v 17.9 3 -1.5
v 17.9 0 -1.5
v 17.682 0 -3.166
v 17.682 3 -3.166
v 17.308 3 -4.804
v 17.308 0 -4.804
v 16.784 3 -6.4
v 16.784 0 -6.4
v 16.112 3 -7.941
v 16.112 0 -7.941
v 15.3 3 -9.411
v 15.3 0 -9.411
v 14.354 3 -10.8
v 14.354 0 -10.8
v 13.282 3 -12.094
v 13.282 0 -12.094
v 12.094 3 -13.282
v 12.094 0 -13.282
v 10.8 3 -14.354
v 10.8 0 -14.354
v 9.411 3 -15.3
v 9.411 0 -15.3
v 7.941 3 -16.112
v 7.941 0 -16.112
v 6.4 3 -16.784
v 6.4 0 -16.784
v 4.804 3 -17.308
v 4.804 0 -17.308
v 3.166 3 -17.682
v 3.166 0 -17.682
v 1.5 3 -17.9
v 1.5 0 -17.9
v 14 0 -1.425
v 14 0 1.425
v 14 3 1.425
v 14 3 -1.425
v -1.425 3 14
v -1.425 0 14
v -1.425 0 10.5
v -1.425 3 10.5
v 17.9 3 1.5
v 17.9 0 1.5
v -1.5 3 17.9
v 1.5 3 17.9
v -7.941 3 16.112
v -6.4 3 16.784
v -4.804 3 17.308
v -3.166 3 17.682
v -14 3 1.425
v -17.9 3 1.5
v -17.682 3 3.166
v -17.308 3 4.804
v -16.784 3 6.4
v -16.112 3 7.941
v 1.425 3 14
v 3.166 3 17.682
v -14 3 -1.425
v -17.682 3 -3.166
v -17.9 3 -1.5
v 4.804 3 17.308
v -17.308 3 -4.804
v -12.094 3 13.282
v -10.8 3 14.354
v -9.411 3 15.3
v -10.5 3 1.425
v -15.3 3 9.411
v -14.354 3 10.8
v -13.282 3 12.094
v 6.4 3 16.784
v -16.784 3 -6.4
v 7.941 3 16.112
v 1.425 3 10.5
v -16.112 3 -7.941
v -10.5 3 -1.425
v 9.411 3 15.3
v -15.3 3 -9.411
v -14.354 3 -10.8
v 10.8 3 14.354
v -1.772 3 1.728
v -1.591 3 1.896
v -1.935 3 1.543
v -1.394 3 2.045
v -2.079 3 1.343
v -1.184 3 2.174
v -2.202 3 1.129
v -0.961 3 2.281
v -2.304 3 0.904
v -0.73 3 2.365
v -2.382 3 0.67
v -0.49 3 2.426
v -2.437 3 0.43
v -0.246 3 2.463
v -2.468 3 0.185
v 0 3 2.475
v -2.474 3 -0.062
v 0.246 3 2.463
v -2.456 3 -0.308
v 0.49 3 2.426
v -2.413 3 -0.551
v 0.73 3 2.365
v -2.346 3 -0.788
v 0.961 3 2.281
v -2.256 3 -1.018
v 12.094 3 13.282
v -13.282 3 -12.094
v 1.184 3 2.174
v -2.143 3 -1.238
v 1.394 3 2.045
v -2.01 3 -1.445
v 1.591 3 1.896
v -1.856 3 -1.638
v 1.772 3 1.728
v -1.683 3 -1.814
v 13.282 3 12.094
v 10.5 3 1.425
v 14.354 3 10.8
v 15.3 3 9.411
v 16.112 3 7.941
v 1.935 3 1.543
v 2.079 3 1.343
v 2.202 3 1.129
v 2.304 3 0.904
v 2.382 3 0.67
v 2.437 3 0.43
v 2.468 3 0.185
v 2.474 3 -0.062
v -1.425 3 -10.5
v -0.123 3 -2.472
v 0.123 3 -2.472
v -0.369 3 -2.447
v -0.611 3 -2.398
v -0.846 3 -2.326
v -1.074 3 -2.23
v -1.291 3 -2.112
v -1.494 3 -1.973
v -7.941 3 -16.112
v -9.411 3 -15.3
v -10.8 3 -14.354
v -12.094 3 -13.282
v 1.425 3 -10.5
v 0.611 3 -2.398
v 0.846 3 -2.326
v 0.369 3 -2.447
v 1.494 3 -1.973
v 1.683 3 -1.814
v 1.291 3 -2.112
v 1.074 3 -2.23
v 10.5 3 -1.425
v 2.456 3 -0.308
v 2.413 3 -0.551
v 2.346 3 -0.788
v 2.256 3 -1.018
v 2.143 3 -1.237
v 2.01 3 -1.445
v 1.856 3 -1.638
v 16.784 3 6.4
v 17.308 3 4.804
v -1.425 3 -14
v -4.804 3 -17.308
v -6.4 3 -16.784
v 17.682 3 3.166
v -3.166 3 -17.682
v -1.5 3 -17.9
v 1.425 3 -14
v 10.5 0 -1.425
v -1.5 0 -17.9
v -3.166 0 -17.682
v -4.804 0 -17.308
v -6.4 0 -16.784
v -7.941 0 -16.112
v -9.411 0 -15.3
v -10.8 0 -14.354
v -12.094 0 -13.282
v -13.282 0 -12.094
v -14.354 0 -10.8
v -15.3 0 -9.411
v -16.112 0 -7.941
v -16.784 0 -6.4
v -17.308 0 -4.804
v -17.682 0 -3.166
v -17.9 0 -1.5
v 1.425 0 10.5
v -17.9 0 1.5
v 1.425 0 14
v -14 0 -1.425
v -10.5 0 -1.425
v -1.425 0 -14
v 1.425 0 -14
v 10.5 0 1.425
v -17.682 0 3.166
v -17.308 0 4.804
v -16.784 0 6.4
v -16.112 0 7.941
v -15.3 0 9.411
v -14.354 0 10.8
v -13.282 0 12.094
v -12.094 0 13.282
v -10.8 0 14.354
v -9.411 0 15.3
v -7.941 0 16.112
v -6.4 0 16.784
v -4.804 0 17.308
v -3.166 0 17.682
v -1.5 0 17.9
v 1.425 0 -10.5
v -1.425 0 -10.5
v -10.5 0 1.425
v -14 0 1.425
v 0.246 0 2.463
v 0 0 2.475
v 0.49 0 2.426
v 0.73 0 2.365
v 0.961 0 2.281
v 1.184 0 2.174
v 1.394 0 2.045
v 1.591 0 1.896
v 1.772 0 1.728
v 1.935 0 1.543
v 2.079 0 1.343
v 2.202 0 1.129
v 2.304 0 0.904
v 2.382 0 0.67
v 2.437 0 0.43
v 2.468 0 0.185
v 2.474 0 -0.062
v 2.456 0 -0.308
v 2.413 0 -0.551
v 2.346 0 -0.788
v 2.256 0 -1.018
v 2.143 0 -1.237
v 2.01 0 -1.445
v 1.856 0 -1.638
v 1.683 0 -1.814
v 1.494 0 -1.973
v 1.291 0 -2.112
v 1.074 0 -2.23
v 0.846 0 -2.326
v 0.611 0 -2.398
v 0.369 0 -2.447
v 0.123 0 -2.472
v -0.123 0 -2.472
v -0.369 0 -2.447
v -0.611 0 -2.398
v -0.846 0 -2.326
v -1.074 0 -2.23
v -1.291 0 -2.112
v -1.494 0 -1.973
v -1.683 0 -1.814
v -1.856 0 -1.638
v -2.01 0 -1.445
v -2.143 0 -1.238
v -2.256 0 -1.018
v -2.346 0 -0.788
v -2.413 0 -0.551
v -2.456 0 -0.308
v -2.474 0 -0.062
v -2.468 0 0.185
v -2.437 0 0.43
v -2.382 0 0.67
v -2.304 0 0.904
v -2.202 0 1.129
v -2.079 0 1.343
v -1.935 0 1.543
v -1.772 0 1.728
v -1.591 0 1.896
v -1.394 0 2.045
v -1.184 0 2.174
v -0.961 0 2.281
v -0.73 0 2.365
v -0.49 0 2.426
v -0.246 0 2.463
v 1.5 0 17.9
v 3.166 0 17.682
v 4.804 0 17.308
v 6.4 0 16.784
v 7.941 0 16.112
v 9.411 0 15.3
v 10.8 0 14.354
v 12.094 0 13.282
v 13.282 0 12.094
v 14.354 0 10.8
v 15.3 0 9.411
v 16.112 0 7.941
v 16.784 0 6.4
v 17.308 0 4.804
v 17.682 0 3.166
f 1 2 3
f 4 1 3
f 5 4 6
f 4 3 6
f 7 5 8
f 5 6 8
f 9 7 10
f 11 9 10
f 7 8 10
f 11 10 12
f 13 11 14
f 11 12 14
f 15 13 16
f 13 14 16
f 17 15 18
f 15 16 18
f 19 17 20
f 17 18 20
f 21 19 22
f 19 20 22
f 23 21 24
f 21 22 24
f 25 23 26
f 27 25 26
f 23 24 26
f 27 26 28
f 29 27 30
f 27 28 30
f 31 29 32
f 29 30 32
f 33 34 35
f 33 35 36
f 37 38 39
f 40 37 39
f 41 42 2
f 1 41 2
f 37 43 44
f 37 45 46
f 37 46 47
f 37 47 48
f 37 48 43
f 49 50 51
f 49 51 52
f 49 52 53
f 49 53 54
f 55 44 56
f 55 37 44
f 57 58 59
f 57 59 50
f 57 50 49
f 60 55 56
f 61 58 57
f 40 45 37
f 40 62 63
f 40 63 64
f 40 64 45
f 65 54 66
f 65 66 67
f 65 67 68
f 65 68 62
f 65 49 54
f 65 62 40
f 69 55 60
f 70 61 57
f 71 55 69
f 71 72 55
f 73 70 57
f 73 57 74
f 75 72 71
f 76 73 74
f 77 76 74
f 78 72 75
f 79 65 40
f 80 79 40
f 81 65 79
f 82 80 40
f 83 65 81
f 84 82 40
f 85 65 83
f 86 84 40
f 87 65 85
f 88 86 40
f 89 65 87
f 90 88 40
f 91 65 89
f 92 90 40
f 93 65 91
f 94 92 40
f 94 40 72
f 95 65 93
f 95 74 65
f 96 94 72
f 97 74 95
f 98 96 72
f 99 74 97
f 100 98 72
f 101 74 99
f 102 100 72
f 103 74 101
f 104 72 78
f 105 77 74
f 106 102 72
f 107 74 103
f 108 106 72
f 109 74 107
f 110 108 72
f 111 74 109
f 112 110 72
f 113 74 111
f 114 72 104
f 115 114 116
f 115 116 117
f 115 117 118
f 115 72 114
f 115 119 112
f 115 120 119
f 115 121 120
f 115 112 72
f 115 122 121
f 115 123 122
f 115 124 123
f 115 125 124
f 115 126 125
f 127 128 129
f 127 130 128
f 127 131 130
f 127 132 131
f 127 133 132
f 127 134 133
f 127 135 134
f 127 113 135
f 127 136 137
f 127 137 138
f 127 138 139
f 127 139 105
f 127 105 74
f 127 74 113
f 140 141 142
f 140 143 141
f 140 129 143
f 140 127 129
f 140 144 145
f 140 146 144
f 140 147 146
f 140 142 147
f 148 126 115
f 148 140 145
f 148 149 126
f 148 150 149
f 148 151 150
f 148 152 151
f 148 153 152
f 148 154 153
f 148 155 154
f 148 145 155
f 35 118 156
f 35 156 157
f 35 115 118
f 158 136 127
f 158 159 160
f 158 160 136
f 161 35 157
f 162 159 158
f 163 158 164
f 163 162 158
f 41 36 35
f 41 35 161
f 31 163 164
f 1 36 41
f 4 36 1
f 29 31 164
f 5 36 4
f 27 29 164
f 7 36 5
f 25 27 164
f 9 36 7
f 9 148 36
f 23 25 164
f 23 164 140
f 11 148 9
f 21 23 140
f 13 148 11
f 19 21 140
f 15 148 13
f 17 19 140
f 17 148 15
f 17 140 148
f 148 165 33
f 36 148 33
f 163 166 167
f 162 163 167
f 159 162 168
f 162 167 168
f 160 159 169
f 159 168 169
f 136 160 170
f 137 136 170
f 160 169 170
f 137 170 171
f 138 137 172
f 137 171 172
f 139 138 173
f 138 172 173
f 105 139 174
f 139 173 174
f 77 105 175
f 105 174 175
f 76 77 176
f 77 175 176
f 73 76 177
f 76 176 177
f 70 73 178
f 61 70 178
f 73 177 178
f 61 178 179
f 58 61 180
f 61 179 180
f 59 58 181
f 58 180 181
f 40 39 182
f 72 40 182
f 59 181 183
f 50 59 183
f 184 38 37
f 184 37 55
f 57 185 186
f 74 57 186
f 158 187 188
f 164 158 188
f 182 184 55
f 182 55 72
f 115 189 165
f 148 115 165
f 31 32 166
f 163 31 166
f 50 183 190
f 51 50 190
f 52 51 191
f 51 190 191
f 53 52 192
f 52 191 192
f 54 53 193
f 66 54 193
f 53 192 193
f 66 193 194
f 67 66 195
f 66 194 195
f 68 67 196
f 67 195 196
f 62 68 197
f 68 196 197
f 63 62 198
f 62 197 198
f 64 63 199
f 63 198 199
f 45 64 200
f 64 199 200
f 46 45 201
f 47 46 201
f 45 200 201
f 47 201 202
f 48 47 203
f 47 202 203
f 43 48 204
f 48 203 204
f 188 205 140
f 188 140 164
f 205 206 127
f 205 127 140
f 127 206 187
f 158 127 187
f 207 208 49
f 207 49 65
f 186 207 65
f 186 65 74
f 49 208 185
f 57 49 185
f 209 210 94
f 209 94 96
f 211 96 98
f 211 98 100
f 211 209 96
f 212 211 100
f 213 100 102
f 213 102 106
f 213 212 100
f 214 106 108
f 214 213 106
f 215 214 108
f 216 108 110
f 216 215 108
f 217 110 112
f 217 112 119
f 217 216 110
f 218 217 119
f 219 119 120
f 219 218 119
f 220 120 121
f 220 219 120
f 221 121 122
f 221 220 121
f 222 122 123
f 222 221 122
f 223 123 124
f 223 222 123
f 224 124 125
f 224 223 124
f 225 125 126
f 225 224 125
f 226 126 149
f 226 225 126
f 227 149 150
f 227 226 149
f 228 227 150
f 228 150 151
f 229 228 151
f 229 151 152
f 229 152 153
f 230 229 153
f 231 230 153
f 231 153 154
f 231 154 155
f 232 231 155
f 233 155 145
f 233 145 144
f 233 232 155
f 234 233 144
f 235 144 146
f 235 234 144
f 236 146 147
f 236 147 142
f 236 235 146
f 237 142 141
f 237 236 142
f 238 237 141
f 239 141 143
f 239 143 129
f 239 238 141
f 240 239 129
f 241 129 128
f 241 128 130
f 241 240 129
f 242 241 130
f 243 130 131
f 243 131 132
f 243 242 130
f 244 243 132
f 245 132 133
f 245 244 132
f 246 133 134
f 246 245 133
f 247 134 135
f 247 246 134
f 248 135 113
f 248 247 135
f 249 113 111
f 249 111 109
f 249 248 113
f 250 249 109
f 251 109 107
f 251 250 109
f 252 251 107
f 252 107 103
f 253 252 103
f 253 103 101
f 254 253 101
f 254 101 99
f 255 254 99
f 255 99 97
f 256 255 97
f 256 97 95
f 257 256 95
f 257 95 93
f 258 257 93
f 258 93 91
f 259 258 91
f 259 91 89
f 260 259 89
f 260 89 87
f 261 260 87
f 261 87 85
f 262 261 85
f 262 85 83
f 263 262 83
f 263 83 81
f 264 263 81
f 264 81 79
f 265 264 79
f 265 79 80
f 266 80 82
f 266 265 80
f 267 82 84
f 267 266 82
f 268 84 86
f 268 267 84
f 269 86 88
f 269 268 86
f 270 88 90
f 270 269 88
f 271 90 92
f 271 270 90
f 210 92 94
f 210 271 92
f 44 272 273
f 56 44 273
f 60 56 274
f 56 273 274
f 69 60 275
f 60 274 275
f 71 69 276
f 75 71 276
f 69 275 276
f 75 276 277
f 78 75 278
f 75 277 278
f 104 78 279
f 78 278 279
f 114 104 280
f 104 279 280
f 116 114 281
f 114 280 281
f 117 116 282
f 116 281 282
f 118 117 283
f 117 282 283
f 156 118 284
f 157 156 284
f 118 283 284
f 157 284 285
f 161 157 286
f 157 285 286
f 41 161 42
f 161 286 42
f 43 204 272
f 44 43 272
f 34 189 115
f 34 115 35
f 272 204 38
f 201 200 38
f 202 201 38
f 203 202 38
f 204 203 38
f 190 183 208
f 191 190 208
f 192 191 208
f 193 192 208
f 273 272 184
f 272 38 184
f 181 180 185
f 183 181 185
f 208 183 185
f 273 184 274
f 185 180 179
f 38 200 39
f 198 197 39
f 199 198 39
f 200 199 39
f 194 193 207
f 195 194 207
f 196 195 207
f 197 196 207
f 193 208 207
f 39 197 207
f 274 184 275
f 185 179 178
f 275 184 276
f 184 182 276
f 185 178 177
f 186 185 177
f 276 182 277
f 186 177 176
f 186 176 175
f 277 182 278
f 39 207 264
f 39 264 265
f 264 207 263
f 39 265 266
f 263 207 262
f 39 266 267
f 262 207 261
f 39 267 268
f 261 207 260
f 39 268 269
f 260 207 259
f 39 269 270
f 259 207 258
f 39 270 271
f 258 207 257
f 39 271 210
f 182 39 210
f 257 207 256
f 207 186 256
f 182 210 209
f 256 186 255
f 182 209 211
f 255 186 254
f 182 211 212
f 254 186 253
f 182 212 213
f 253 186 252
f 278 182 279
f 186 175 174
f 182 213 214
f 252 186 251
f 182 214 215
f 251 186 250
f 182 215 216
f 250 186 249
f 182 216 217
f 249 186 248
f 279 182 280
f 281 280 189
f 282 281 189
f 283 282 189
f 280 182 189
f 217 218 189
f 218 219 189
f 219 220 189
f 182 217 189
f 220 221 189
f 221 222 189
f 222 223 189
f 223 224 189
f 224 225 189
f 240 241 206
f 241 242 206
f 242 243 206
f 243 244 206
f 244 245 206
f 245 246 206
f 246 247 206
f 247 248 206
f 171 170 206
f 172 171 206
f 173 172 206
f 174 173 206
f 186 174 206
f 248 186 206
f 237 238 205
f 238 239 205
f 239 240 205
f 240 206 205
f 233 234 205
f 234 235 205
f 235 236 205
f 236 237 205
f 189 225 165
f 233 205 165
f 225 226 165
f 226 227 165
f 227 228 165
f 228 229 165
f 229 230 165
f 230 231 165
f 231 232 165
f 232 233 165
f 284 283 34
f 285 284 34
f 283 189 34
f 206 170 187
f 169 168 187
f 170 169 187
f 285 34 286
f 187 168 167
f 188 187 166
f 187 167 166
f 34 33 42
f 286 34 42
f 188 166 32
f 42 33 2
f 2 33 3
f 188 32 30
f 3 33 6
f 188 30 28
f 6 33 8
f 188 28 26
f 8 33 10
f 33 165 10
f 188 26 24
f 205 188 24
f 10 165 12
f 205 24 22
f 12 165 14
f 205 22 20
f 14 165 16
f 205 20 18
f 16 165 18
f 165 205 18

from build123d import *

# Parameters (mm, degrees)
SKETCH1_R           = 2.475
SKETCH1_W           = 2.85
SKETCH1_H           = 3.5
SKETCH1_W_2         = 3.5
SKETCH1_H_2         = 2.85
BOSS_EXTRUDE1_DEPTH = 3


with BuildPart() as part:
    # Sketch1 → Boss-Extrude1 (new body)
    with BuildSketch(Plane(origin=(0, 0, 0), x_dir=(1, 0, 0), z_dir=(0, 1, 0))):
        with BuildLine():
            Line((-1.5, -17.9), (1.5, -17.9))
            ThreePointArc((1.5, -17.9), (12.701574706, -12.701574706), (17.9, -1.5))
            Line((17.9, -1.5), (17.9, 1.5))
            ThreePointArc((17.9, 1.5), (12.701574706, 12.701574706), (1.5, 17.9))
            Line((1.5, 17.9), (-1.5, 17.9))
            ThreePointArc((-1.5, 17.9), (-12.701574706, 12.701574706), (-17.9, 1.5))
            Line((-17.9, 1.5), (-17.9, -1.5))
            ThreePointArc((-17.9, -1.5), (-12.701574706, -12.701574706), (-1.5, -17.9))
        make_face()
        with Locations(Location((0, 0, 0), (0, 0, 270))):
            Circle(SKETCH1_R, mode=Mode.SUBTRACT)
        with Locations((0, -12.25)):
            Rectangle(SKETCH1_W, SKETCH1_H, mode=Mode.SUBTRACT)
        with Locations((-12.25, 0)):
            Rectangle(SKETCH1_W_2, SKETCH1_H_2, mode=Mode.SUBTRACT)
        with Locations((0, 12.25)):
            Rectangle(SKETCH1_W, SKETCH1_H, mode=Mode.SUBTRACT)
        with Locations((12.25, 0)):
            Rectangle(SKETCH1_W_2, SKETCH1_H_2, mode=Mode.SUBTRACT)
    extrude(amount=BOSS_EXTRUDE1_DEPTH)


solid = part.part
